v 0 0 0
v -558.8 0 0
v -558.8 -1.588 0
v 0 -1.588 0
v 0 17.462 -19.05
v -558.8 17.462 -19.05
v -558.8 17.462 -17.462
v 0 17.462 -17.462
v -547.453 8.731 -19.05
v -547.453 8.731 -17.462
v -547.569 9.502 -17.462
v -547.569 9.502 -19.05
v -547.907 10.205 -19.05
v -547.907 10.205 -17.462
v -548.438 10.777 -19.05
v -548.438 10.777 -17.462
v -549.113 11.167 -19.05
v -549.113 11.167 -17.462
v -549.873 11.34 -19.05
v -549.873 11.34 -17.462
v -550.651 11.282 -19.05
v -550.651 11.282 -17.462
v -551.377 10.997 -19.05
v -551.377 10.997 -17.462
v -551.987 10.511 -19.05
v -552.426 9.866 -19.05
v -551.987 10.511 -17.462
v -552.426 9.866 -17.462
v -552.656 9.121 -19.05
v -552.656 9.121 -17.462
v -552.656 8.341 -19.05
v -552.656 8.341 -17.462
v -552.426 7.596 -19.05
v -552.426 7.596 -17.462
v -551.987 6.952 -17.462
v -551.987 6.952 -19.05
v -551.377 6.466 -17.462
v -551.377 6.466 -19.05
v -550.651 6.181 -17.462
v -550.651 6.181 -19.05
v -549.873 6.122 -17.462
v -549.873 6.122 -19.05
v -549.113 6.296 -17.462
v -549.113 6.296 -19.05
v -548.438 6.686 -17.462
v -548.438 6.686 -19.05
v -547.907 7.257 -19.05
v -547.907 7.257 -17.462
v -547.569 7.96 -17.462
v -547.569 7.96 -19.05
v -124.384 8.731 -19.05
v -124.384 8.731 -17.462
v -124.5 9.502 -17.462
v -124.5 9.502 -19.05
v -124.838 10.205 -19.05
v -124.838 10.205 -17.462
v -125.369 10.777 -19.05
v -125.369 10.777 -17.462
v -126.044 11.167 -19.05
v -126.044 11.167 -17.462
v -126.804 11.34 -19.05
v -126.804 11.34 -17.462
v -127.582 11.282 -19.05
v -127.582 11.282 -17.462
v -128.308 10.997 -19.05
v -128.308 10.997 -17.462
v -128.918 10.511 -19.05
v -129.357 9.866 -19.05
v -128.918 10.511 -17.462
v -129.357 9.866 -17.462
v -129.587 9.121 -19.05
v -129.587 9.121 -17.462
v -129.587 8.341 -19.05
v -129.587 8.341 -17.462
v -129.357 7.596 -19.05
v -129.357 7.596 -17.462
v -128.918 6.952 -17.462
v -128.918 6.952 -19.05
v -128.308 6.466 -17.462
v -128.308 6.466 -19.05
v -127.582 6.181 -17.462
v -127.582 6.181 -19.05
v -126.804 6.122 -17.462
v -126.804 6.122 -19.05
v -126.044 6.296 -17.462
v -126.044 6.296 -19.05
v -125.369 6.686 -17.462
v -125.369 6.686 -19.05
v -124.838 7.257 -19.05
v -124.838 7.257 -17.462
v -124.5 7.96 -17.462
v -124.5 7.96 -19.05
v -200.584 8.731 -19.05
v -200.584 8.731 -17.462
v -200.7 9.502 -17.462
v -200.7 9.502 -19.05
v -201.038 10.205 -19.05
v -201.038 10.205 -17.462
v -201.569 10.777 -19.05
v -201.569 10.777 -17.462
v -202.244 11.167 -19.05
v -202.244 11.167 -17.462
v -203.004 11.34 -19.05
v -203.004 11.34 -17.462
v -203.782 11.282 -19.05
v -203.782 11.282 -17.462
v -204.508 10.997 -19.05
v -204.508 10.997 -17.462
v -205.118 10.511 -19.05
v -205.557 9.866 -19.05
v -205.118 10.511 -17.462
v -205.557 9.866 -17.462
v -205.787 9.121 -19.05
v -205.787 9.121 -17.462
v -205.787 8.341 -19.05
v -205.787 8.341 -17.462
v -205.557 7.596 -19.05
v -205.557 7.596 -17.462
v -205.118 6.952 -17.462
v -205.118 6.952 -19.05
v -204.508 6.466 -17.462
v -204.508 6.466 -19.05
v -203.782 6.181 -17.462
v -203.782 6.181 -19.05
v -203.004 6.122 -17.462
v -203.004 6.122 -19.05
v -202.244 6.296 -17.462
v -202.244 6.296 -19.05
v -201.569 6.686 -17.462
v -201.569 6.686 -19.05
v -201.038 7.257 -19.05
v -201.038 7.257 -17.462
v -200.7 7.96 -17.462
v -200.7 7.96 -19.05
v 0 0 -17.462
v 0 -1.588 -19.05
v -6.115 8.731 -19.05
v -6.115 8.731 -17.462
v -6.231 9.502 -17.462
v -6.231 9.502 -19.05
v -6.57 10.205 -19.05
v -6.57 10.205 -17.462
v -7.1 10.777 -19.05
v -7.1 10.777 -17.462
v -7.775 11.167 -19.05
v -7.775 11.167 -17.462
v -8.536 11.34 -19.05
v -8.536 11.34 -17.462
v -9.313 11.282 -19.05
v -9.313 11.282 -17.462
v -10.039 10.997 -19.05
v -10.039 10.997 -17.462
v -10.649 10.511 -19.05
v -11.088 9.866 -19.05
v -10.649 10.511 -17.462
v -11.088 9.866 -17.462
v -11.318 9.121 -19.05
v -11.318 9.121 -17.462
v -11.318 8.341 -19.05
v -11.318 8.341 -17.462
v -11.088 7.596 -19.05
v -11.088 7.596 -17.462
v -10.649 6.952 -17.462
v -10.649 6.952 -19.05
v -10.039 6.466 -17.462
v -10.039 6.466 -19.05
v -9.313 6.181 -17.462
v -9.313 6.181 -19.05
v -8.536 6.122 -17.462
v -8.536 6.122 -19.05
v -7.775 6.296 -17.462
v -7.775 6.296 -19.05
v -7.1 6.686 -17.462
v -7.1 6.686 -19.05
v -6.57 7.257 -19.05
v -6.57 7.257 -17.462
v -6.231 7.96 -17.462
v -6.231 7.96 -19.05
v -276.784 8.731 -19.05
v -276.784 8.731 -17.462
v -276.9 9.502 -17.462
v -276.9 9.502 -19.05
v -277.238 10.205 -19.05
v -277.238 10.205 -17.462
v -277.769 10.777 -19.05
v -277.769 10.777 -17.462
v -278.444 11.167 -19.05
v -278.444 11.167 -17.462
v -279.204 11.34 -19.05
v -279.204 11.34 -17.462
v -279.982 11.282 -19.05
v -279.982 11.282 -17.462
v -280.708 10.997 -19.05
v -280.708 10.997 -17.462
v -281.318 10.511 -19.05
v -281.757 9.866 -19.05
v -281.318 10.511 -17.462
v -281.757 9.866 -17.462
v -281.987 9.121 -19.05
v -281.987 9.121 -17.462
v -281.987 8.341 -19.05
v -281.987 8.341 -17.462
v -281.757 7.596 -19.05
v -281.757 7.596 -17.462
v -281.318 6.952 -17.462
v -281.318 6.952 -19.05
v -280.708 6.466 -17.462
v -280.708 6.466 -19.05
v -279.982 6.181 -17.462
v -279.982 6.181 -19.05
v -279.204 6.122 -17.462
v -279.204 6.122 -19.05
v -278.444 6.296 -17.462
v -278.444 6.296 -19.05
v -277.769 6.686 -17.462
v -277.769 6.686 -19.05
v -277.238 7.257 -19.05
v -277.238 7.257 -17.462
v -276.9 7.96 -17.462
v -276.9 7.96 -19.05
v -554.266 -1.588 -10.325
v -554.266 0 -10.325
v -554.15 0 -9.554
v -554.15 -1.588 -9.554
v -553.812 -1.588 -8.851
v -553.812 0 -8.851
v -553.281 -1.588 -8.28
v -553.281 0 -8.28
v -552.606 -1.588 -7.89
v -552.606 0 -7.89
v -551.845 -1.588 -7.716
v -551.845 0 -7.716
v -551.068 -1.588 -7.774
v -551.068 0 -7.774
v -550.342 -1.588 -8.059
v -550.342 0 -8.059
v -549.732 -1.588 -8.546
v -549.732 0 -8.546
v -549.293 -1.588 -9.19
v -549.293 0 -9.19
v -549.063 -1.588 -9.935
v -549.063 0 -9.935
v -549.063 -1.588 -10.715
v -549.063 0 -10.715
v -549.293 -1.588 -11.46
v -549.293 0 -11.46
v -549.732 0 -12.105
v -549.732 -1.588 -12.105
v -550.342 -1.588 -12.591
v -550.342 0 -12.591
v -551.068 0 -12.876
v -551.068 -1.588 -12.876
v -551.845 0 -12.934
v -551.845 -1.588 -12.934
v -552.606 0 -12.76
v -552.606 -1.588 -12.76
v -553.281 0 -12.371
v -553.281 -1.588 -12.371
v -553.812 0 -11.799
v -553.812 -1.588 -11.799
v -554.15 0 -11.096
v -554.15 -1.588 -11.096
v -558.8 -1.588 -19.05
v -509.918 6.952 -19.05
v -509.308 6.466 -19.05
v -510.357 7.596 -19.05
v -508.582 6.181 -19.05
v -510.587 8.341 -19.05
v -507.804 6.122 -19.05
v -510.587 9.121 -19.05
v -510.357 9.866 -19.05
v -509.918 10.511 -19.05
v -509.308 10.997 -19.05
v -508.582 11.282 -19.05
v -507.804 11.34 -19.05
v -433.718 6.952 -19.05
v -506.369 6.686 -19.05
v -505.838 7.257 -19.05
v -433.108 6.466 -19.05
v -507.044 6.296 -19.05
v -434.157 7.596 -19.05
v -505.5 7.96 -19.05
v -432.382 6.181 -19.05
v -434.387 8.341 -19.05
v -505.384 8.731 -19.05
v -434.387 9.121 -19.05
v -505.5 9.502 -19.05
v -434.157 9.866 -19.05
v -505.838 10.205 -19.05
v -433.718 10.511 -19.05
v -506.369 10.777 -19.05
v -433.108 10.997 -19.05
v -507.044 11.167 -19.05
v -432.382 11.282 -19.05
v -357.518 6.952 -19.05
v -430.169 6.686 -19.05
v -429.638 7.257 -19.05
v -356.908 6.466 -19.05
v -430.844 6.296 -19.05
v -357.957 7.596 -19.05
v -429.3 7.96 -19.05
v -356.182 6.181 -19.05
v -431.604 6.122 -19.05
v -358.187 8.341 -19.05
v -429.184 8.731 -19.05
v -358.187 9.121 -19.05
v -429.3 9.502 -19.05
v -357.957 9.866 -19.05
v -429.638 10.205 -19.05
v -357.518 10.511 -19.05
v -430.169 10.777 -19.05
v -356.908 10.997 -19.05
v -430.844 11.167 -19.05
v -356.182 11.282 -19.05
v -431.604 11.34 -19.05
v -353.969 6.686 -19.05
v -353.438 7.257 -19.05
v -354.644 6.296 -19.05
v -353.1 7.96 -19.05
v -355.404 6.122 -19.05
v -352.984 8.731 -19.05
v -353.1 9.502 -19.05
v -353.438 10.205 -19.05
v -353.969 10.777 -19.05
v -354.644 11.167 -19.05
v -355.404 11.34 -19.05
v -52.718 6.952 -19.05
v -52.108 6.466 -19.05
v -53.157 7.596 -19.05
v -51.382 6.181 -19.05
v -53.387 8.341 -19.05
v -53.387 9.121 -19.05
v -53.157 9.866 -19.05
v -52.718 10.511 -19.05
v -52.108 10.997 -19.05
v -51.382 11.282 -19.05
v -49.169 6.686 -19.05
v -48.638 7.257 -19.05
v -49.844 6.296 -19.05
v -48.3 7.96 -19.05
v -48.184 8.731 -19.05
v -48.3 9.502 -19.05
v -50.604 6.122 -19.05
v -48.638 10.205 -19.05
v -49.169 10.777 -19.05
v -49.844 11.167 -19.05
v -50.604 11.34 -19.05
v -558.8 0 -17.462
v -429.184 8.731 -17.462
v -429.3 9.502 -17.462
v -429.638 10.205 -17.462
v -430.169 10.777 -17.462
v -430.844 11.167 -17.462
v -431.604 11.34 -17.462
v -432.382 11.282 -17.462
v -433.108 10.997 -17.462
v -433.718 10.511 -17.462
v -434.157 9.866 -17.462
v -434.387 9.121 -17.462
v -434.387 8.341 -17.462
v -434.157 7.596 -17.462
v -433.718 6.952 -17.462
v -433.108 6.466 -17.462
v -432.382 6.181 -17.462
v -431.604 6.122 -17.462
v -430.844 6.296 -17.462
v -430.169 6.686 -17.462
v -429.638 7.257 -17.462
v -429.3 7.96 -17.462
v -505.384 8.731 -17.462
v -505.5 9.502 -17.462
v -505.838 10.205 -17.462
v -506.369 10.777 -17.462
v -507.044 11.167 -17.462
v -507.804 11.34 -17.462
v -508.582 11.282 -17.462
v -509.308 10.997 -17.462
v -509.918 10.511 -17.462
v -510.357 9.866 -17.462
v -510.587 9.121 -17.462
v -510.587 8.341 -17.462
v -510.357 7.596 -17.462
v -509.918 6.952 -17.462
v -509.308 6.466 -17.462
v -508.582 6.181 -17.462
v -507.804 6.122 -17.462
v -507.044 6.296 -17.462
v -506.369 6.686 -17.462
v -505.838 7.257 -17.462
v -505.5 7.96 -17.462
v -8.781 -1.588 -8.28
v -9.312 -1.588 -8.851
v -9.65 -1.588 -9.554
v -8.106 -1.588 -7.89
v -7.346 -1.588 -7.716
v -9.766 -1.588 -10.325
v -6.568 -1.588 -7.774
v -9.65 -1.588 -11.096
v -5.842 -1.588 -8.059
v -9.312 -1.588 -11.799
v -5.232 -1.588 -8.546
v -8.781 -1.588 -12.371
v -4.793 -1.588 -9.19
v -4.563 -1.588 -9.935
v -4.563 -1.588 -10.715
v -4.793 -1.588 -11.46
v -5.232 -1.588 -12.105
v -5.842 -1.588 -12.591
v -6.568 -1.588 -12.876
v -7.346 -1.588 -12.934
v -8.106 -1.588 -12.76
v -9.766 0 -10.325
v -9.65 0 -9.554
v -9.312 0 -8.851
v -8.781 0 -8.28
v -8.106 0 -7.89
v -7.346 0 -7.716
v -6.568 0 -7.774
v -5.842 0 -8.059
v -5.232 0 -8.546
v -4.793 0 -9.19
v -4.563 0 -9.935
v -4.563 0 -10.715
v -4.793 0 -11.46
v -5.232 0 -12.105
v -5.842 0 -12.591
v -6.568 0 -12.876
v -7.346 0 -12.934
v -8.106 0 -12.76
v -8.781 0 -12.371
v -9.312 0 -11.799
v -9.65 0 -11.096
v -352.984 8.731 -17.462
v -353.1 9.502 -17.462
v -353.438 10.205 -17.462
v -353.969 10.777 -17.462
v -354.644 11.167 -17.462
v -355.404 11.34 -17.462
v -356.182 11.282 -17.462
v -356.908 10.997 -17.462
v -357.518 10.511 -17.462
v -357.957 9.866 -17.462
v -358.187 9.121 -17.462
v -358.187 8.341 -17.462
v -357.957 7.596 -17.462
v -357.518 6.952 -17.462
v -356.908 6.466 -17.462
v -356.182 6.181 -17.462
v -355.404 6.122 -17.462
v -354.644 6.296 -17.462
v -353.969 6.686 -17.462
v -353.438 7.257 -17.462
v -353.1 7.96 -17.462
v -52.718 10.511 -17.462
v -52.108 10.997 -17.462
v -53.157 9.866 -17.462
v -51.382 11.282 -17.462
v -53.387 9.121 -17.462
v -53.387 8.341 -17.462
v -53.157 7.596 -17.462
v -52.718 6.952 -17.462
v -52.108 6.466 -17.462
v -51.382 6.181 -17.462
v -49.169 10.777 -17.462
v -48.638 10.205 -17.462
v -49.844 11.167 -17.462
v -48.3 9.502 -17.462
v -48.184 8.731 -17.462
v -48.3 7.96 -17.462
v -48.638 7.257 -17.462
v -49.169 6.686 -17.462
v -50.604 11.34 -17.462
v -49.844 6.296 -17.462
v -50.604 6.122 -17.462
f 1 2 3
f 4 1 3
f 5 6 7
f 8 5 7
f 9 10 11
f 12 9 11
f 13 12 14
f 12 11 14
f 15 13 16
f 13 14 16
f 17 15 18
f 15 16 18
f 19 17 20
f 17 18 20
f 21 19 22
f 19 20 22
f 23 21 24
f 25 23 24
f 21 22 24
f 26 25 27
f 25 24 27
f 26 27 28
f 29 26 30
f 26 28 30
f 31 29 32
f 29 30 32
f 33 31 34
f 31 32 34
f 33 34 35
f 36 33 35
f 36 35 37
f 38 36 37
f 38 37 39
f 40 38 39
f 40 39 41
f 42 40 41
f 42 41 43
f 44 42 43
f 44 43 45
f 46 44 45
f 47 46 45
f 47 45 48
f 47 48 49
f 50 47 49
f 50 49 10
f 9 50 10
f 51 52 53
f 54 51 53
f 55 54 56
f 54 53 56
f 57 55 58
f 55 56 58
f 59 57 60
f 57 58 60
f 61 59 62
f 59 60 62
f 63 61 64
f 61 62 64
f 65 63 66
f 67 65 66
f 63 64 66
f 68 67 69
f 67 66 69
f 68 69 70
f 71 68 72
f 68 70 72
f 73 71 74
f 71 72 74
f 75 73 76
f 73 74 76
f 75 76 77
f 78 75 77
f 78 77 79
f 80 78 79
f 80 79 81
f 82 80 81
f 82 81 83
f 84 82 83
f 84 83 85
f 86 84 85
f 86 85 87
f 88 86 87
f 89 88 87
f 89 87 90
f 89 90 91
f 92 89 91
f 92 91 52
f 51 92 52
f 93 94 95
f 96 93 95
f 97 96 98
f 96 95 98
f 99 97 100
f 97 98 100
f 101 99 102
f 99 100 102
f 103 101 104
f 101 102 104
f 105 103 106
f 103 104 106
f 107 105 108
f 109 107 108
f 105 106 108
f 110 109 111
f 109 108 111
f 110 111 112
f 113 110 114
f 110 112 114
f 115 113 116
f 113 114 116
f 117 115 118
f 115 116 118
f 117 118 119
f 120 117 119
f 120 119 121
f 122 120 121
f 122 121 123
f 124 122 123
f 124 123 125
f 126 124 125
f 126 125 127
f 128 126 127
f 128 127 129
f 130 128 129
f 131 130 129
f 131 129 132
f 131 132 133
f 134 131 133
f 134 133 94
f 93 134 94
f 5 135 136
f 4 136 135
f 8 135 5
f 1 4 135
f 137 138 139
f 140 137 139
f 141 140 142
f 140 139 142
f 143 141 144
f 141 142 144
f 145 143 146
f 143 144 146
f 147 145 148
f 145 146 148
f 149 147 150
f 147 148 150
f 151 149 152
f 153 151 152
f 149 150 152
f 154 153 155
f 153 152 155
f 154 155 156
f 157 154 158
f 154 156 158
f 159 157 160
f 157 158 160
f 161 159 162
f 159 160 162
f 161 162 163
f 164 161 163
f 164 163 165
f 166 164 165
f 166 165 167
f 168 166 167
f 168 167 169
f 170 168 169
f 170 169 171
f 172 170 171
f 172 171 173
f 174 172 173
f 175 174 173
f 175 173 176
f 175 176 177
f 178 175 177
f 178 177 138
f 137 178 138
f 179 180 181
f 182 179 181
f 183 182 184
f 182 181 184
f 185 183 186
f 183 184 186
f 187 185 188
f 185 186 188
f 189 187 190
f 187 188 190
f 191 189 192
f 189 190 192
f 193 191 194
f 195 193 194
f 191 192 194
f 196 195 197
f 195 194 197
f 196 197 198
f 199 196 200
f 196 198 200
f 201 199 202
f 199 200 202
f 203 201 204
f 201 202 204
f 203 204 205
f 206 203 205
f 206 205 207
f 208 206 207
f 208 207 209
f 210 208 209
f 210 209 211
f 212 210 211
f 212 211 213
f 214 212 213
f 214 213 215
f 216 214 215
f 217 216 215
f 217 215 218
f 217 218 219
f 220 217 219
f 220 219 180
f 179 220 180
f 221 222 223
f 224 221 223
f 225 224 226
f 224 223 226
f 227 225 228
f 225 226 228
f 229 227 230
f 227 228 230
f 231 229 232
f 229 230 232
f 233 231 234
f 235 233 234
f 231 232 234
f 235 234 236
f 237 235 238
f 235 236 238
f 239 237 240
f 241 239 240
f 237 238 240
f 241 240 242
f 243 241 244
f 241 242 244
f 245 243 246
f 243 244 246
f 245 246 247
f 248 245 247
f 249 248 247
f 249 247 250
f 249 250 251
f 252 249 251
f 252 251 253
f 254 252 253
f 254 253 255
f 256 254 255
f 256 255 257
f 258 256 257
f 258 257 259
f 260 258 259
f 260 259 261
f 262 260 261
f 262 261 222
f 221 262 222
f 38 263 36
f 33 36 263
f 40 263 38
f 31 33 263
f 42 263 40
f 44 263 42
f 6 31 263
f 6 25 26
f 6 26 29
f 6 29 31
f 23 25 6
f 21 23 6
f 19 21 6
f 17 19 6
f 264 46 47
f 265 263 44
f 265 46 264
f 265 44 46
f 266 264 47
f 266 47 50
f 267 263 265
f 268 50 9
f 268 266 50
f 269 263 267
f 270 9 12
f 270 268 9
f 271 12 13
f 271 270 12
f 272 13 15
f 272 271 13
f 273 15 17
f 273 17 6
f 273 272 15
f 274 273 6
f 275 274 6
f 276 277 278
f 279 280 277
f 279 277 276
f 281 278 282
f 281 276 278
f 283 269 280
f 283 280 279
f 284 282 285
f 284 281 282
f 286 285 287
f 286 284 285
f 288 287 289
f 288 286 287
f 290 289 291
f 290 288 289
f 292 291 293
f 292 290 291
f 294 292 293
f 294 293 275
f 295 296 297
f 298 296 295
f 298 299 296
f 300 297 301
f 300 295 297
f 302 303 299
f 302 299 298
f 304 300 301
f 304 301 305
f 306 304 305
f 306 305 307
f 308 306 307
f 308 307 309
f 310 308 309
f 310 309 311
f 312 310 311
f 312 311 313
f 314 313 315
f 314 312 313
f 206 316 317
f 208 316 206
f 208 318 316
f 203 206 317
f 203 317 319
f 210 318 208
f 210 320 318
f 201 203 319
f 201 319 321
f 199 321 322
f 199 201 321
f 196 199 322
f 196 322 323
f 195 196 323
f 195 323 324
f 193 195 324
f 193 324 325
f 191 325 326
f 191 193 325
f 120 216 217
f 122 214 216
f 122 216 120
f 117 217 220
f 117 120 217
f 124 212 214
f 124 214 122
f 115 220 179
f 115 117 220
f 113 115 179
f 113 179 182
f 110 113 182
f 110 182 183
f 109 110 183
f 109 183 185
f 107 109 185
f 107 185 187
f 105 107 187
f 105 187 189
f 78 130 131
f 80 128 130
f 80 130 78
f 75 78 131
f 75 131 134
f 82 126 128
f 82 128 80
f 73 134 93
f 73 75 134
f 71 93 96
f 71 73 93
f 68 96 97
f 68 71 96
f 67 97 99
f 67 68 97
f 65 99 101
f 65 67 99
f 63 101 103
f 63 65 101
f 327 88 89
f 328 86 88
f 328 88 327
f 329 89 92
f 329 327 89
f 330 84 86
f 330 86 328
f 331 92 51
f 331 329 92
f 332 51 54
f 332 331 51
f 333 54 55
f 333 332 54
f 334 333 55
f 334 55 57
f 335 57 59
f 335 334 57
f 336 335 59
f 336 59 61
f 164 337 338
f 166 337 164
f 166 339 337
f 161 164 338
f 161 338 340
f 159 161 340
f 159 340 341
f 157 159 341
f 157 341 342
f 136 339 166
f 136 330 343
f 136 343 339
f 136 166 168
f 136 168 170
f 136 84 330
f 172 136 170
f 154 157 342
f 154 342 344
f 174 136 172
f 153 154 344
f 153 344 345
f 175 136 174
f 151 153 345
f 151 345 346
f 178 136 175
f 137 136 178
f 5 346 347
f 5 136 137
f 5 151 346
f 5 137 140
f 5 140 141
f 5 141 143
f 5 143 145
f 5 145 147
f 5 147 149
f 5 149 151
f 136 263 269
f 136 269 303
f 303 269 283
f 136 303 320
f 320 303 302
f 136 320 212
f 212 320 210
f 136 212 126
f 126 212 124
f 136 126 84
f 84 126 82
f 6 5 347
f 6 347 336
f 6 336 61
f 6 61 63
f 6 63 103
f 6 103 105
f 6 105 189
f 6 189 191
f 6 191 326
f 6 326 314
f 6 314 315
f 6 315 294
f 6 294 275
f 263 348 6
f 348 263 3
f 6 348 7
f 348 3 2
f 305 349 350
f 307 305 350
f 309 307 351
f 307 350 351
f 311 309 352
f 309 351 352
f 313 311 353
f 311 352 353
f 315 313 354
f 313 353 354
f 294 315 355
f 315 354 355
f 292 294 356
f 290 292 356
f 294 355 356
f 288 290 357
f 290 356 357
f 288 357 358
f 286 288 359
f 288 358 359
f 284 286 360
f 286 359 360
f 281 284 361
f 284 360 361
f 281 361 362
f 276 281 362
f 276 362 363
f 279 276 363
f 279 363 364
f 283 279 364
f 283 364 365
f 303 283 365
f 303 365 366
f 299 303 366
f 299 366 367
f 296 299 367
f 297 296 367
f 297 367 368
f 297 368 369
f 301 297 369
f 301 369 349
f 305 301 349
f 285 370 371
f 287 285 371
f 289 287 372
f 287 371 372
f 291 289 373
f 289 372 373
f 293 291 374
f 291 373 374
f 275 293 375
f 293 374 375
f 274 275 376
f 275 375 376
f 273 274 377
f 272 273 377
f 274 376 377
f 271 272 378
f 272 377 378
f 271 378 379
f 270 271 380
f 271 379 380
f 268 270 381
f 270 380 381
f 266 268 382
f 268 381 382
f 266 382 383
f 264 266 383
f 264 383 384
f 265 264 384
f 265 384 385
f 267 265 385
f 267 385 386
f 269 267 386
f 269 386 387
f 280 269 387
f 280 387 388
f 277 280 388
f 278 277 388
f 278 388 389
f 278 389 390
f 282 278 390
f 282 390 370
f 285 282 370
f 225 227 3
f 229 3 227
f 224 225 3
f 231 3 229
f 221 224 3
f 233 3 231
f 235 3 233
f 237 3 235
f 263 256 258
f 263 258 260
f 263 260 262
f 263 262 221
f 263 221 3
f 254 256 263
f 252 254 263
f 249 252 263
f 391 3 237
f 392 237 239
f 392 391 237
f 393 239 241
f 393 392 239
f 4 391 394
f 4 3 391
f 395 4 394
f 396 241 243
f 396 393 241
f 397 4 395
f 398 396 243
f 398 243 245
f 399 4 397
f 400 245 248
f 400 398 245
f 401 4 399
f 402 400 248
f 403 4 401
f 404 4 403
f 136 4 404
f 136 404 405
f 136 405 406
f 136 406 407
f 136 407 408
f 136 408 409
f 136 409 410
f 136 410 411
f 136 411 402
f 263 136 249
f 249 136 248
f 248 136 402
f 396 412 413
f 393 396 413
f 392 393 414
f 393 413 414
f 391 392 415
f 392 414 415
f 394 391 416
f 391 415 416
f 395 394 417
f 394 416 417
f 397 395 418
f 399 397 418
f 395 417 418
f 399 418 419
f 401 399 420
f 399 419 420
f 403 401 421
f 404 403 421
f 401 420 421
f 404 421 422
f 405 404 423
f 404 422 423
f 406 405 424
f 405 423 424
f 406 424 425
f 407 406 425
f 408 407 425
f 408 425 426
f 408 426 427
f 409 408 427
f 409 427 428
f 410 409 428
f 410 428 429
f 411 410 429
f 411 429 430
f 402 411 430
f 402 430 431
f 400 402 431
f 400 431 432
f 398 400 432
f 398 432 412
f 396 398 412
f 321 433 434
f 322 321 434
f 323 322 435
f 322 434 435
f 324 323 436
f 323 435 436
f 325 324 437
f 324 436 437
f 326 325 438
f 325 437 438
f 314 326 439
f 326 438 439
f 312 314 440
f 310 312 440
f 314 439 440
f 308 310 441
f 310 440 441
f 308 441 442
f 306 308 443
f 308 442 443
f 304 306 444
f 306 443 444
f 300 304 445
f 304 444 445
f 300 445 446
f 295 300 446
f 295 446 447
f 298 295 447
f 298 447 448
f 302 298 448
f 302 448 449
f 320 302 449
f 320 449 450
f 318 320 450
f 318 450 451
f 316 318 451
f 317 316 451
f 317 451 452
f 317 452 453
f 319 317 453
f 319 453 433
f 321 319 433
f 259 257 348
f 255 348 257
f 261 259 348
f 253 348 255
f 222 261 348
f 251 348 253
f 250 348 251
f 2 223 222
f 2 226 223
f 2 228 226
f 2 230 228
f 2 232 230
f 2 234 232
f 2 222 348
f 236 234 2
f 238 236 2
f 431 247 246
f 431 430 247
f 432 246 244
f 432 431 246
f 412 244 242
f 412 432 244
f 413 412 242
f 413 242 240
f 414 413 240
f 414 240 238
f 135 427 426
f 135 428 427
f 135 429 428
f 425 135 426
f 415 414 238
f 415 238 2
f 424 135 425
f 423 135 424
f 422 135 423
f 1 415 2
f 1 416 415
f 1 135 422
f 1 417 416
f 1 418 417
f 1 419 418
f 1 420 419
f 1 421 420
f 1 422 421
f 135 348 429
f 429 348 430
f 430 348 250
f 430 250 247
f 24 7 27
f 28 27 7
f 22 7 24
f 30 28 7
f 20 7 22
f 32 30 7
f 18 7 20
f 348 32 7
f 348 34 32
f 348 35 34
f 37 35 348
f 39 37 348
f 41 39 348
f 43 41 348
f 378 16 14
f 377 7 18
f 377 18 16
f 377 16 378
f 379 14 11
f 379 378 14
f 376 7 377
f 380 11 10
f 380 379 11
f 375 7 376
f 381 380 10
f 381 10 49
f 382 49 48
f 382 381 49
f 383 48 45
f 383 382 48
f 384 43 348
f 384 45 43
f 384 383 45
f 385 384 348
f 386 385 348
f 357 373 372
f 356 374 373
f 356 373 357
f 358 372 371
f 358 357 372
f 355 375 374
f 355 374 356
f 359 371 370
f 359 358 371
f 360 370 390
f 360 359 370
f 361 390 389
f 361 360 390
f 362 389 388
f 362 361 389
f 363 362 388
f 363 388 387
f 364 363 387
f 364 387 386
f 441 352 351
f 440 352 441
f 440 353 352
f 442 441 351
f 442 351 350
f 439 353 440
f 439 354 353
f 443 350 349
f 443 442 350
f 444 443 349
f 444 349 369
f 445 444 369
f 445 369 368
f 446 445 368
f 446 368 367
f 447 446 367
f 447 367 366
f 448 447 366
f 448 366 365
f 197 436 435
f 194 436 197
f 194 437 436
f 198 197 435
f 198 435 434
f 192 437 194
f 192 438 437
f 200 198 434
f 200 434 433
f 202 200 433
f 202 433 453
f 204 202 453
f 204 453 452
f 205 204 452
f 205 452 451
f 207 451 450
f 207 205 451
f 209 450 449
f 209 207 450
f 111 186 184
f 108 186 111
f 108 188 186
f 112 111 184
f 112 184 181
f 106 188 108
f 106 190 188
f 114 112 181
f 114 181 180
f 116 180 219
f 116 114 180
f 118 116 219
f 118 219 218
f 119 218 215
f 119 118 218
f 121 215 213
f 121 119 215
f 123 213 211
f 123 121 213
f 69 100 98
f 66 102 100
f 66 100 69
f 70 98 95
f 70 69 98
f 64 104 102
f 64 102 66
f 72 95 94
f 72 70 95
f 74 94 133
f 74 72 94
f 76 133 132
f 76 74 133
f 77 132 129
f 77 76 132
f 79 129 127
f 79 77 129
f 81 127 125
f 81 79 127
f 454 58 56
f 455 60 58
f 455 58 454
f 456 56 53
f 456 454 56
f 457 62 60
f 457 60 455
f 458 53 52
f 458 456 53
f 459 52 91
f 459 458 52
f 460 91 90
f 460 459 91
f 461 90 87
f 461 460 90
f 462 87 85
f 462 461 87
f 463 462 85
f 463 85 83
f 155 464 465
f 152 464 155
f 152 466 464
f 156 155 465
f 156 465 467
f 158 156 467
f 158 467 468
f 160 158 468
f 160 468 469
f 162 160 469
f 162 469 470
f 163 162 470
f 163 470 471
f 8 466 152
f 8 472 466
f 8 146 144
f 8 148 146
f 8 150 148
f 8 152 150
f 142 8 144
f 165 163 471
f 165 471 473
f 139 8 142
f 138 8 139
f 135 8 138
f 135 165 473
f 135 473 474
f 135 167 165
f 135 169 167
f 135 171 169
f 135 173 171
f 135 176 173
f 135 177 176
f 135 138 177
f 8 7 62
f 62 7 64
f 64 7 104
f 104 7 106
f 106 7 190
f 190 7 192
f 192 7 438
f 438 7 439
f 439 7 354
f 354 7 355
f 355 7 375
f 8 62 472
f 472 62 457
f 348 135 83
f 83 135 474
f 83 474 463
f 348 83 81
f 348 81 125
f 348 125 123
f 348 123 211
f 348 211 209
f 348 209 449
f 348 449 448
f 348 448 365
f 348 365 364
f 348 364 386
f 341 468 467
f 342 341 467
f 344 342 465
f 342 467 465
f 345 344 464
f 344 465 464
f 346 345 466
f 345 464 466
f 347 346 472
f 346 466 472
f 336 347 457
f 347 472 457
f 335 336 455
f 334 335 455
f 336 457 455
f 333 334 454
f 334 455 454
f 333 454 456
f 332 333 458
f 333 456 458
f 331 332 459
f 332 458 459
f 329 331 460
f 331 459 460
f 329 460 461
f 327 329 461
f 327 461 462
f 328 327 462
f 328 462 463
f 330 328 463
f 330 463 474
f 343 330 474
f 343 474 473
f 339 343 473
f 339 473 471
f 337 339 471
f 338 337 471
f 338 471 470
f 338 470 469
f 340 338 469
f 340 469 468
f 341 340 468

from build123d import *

# Parameters (mm, degrees)
F1_DEPTH = 558.8
F2_R     = 2.6162
F4_DEPTH = 25.4
F3_R     = 2.6162
F5_DEPTH = 25.4


with BuildPart() as f1:
    # F0 (on Right) → F1 (new body)
    with BuildSketch(Plane.YZ):
        Polygon((0, -17.4625), (0, 0), (-1.5875, 0), (-1.5875, -19.05), (17.4625, -19.05), (17.4625, -17.4625), align=None)
    extrude(amount=-F1_DEPTH)

    # F2 (on face) → F4 (cut)
    with BuildSketch(Plane(origin=(0, 0, 0), x_dir=(-1, 0, 0), z_dir=(0, 1, 0))):
        with Locations((7.1501, -10.3251)):
            Circle(F2_R)
        with Locations((551.6499, -10.3251)):
            Circle(F2_R)
    extrude(amount=-F4_DEPTH, mode=Mode.SUBTRACT)

    # F3 (on face) → F5 (cut)
    with BuildSketch(Plane.XY.offset(-17.4625)):
        with Locations((-8.73125, 8.73125)):
            Circle(F3_R)
        with Locations((-550.06875, 8.73125)):
            Circle(F3_R)
        with Locations((-50.8, 8.73125)):
            Circle(F3_R)
        with Locations((-127, 8.73125)):
            Circle(F3_R)
        with Locations((-203.2, 8.73125)):
            Circle(F3_R)
        with Locations((-279.4, 8.73125)):
            Circle(F3_R)
        with Locations((-355.6, 8.73125)):
            Circle(F3_R)
        with Locations((-431.8, 8.73125)):
            Circle(F3_R)
        with Locations((-508, 8.73125)):
            Circle(F3_R)
    extrude(amount=-F5_DEPTH, mode=Mode.SUBTRACT)


solid = f1.part
